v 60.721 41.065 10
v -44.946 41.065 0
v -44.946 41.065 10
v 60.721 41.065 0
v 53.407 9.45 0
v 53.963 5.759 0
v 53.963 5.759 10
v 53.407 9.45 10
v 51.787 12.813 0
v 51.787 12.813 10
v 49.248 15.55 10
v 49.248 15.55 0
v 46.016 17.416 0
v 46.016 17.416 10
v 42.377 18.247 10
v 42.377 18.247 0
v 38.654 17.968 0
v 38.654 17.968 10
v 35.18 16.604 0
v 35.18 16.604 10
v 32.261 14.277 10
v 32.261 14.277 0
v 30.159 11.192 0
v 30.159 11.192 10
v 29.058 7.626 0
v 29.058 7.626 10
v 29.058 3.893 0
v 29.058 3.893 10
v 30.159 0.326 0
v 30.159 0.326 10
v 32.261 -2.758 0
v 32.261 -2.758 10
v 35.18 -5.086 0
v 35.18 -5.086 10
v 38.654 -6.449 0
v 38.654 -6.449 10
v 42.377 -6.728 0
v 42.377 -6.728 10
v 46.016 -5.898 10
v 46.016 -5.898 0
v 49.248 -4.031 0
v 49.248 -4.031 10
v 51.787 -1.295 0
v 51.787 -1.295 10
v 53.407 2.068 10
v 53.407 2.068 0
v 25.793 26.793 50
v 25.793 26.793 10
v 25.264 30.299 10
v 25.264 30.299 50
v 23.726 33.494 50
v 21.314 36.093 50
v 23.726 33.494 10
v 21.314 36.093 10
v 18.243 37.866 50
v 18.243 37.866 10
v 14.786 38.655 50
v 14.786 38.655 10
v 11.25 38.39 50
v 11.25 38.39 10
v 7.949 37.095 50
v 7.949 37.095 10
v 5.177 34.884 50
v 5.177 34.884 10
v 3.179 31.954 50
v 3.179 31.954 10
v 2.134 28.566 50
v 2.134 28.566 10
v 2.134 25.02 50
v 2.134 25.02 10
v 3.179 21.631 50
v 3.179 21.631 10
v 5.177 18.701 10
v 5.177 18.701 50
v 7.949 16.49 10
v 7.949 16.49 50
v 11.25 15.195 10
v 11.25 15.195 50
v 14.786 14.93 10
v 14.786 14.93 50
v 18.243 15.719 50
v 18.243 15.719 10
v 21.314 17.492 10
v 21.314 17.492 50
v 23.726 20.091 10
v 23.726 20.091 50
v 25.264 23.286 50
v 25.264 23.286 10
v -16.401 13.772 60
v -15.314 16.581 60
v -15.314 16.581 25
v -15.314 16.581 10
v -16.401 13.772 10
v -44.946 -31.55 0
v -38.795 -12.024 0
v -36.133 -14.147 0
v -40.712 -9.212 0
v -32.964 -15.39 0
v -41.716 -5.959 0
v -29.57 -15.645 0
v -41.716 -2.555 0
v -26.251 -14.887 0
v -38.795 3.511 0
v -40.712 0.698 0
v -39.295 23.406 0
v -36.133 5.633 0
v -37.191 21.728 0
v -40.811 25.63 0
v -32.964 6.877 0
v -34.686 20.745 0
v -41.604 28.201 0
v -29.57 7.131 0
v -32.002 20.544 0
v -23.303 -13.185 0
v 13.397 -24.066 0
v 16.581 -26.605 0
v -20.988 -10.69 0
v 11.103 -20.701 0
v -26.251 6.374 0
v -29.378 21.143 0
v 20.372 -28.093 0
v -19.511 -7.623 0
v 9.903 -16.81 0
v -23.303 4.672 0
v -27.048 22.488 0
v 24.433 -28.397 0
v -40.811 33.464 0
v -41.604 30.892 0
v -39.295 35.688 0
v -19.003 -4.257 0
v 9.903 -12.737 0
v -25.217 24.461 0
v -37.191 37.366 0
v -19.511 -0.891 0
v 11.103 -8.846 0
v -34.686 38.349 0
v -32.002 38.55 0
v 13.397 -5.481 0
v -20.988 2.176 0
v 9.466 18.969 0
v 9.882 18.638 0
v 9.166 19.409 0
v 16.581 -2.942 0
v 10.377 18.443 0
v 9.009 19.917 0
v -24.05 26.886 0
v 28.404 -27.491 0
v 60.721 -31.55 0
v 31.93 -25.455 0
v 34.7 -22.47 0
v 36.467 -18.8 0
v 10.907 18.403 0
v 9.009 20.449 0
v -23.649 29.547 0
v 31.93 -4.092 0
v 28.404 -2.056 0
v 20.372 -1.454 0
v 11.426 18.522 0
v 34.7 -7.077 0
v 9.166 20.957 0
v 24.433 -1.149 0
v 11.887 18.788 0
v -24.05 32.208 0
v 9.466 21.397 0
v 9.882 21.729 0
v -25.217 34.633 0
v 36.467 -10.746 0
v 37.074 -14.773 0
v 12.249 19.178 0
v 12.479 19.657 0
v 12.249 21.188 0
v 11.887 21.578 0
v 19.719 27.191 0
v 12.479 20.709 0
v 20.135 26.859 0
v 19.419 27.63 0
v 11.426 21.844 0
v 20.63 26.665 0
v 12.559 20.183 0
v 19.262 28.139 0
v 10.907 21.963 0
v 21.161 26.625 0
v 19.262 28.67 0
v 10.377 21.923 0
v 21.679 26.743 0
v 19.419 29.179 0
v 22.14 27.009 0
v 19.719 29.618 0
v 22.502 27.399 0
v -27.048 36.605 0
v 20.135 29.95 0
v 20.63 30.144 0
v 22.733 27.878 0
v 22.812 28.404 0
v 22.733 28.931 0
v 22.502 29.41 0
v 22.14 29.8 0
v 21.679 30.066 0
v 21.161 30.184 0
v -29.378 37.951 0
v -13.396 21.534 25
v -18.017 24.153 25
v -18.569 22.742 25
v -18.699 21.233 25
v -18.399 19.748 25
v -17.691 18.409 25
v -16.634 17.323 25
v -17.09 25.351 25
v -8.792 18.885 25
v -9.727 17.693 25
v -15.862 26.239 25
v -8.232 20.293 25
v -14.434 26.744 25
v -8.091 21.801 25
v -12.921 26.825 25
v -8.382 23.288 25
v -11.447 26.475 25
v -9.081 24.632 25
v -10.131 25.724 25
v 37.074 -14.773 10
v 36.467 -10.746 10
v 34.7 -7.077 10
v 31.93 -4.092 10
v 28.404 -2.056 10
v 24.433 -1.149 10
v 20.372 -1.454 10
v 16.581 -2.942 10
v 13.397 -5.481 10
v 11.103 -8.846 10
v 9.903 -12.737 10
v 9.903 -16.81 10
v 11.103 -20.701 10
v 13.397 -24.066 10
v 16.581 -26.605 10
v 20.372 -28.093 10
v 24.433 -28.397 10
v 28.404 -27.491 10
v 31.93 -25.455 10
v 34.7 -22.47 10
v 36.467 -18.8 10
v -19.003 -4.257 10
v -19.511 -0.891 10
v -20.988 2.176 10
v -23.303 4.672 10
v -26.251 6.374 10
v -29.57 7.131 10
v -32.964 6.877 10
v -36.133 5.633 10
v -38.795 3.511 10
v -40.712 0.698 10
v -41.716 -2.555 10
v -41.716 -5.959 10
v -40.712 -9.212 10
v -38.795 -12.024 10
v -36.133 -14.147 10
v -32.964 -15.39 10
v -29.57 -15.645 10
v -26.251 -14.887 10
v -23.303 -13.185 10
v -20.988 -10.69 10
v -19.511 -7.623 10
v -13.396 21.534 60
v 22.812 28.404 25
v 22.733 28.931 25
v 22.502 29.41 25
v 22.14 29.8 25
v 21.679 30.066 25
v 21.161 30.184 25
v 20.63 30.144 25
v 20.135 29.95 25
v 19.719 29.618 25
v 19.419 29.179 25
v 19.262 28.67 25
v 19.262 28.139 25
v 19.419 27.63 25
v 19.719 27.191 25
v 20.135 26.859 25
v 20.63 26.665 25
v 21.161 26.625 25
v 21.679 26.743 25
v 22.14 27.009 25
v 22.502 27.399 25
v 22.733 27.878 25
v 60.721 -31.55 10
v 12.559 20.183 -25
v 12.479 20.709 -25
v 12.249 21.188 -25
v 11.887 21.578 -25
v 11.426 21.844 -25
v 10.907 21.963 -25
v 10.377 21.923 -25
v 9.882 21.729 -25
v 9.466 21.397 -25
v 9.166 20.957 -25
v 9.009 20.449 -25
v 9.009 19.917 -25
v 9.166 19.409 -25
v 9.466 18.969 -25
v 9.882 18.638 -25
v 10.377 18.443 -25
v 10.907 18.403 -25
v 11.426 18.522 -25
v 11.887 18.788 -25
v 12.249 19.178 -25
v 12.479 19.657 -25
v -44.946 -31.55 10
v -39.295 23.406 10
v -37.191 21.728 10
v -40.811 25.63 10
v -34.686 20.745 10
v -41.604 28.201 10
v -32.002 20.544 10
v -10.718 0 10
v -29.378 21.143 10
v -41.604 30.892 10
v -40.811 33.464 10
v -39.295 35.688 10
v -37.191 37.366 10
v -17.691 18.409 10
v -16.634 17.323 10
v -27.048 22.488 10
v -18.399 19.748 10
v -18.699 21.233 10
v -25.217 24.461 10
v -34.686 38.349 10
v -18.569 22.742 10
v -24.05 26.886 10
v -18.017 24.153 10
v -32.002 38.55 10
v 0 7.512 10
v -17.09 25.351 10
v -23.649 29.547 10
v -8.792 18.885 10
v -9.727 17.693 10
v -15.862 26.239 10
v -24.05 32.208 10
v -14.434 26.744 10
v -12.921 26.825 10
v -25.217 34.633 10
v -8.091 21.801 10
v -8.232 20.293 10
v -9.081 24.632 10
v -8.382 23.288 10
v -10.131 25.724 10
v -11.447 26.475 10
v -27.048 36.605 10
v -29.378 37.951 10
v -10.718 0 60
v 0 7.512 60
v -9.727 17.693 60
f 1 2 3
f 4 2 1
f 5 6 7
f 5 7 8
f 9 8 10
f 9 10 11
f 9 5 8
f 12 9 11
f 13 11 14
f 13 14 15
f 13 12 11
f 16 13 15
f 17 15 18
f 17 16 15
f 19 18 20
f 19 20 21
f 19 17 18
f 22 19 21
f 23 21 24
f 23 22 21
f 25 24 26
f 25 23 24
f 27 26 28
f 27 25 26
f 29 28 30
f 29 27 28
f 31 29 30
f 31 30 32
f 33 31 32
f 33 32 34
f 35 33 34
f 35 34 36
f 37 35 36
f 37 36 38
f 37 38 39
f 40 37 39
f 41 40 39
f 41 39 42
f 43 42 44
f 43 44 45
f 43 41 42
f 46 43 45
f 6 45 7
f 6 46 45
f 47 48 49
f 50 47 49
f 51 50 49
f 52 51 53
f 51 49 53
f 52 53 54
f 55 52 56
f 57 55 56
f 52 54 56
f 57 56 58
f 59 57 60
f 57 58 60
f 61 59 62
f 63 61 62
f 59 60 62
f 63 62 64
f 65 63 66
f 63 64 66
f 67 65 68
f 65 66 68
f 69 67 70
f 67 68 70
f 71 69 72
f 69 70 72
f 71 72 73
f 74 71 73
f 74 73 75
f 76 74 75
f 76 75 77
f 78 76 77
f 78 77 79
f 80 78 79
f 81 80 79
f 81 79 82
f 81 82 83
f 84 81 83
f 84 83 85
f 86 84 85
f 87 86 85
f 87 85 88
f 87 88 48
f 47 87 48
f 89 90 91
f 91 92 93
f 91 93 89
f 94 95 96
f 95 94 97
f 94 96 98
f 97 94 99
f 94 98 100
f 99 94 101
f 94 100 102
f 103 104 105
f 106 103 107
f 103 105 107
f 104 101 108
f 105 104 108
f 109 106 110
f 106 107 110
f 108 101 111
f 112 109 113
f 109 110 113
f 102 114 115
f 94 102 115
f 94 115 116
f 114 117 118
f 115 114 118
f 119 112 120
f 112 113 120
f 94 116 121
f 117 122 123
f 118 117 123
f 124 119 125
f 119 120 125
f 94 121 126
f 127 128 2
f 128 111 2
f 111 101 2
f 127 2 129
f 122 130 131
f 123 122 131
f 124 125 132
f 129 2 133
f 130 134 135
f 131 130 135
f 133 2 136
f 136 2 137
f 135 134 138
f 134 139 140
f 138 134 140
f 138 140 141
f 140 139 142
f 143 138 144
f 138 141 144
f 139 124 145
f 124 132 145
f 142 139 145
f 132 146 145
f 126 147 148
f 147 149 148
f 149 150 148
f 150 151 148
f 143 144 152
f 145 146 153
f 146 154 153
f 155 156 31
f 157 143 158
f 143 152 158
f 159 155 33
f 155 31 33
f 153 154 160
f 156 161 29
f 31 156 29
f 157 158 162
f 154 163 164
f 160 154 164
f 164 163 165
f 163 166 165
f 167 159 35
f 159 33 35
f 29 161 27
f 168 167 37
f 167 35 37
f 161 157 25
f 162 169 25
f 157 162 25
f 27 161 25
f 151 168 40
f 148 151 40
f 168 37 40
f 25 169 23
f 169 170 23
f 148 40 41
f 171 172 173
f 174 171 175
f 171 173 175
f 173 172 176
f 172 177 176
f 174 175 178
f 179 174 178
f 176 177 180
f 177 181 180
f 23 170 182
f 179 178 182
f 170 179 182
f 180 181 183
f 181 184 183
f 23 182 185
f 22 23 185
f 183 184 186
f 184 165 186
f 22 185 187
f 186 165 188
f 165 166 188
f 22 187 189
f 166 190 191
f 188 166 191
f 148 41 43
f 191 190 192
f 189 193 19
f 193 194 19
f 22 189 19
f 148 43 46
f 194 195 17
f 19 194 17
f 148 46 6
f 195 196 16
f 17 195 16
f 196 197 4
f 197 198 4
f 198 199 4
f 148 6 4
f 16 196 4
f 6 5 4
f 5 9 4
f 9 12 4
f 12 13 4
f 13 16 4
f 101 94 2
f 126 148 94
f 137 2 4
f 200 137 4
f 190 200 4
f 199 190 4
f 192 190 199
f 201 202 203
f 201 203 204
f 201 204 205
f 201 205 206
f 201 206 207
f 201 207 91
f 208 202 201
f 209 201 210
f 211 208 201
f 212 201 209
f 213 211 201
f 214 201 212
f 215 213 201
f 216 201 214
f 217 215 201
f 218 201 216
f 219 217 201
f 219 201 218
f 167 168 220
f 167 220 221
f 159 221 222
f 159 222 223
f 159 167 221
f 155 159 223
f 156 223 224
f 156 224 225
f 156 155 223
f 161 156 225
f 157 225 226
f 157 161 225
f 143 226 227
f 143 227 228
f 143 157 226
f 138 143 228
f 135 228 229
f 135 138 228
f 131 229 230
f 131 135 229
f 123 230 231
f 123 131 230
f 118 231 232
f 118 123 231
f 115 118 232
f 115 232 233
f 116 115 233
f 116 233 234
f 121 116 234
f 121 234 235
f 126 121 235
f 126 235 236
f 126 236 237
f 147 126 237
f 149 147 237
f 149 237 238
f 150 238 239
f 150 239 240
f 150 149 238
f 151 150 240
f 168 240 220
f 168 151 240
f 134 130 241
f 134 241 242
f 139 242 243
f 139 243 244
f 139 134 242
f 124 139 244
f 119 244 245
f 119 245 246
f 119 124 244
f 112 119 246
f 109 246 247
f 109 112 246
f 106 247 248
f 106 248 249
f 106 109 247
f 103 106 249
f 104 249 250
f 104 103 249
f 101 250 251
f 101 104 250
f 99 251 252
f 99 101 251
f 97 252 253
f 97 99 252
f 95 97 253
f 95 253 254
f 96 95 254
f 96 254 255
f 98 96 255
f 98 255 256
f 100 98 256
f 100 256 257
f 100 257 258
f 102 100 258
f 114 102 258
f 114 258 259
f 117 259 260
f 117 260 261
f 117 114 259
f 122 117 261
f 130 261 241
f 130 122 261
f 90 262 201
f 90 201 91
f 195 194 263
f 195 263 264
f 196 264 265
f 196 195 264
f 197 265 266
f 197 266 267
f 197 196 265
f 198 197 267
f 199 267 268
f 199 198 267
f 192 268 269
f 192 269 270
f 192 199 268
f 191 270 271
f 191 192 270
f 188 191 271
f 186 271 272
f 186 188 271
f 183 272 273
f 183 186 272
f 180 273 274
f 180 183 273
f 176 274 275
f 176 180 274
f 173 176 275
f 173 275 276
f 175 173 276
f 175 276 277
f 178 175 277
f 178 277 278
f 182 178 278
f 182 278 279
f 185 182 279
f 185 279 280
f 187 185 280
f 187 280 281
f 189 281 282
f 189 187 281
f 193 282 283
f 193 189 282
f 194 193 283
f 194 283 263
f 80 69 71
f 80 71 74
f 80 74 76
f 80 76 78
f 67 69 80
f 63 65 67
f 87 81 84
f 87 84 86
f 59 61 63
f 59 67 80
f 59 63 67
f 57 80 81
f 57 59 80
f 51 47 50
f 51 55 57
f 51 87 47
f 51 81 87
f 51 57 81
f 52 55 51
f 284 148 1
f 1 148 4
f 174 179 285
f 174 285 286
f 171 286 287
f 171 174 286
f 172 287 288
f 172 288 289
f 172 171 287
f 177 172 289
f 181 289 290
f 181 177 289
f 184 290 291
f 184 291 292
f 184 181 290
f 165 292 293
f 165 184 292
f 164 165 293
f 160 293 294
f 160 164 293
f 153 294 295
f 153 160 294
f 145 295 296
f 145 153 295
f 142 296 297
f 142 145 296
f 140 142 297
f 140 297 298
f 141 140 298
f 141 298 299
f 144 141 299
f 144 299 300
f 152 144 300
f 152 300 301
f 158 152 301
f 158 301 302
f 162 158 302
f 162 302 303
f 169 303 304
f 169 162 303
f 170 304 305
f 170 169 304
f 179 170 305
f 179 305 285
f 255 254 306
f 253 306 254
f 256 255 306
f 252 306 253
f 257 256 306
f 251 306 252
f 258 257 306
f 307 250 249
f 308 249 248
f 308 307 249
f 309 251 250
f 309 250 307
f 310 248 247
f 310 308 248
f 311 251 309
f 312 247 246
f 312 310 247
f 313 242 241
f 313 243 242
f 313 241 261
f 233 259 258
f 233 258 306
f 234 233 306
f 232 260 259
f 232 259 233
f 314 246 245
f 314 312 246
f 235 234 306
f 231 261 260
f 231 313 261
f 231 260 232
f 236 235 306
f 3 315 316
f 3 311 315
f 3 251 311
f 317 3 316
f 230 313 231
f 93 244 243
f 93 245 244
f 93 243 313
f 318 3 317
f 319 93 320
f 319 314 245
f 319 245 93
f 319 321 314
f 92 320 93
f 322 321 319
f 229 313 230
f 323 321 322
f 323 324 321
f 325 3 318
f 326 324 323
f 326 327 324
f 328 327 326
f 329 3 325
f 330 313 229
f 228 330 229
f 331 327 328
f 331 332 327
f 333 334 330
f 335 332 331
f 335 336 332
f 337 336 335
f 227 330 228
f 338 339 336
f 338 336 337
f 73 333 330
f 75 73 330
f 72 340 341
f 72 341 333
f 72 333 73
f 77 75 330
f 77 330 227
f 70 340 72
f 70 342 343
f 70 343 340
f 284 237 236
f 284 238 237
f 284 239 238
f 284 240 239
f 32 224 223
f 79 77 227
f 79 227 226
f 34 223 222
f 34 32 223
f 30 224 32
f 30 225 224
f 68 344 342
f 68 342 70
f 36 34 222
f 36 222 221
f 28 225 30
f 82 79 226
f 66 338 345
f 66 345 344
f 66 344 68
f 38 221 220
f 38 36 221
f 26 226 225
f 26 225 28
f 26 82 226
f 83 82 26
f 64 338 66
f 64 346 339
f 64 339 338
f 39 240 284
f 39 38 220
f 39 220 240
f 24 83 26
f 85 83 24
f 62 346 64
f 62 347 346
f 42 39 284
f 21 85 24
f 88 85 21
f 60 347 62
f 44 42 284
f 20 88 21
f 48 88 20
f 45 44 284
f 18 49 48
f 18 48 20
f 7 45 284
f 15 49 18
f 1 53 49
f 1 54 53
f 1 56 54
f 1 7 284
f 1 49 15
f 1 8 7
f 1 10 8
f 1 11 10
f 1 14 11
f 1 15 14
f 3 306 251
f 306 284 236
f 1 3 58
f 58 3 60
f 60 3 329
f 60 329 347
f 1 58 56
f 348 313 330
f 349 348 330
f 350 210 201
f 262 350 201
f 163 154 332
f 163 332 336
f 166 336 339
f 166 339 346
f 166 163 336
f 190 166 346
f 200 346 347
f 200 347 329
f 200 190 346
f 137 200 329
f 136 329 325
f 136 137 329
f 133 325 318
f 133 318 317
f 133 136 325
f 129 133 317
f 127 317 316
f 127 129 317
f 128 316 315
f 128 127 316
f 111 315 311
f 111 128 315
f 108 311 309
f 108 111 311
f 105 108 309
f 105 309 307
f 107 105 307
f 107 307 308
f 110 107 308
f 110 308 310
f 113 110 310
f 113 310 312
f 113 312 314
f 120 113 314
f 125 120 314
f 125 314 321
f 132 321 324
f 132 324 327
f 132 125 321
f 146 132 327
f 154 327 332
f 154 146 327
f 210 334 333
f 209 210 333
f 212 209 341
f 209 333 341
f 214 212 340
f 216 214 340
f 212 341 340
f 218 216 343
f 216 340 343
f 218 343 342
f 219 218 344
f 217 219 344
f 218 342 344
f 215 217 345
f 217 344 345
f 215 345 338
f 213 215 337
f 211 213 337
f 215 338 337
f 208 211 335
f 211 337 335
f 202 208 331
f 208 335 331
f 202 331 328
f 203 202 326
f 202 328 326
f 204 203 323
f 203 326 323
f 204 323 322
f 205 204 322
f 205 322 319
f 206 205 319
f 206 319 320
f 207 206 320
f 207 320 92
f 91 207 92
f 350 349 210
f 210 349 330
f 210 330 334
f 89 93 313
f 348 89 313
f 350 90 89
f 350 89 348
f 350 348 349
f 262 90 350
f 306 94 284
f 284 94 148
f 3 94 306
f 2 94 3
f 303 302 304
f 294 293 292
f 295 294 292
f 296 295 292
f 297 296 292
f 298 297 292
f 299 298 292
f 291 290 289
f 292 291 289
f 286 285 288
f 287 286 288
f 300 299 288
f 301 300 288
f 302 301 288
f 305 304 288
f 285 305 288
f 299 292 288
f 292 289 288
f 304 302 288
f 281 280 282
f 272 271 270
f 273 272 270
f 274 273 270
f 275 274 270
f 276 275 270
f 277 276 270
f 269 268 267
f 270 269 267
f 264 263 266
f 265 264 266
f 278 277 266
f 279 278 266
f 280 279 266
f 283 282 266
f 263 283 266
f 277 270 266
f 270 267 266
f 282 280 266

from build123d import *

# Parameters (mm, degrees)
F1_DEPTH = 60
F2_DEPTH = 25
F0_W     = 105.667732
F0_H     = 72.615263
F0_R     = 11.419882
F0_R_2   = 13.662159
F0_R_3   = 9.028208
F0_R_4   = 12.522377
F0_R_5   = 11.895855
F3_DEPTH = 10
F0_R_6   = 1.784712
F4_DEPTH = 50
F5_DEPTH = 25
F6_DEPTH = 25


with BuildPart() as f1:
    # F0 (on Top) → F1 (new body)
    with BuildSketch(Plane.XY):
        Polygon((-9.727011, 17.693468), (-13.396265, 21.534182), (-15.313769, 16.580629), (-16.401034, 13.77186), (-10.718366, 0), (0, 7.511924), align=None)
    extrude(amount=F1_DEPTH)

    # F0 (on Top) → F2 (join)
    with BuildSketch(Plane.XY):
        with BuildLine():
            Line((-15.313769, 16.580629), (-13.396265, 21.534182))
            Line((-13.396265, 21.534182), (-9.727011, 17.693468))
            ThreePointArc((-9.727011, 17.693468), (-14.433935, 26.743573), (-15.313769, 16.580629))
        make_face()
    extrude(amount=F2_DEPTH)

    # F0 (on Top) → F3 (join)
    with BuildSketch(Plane.XY):
        with Locations((7.88752, 4.757551)):
            Rectangle(F0_W, F0_H)
        with Locations((-30.423293, -4.256757)):
            Circle(F0_R, mode=Mode.SUBTRACT)
        with Locations((23.412162, -14.77345)):
            Circle(F0_R_2, mode=Mode.SUBTRACT)
        with BuildLine():
            Line((-16.401034, 13.77186), (-15.313769, 16.580629))
            ThreePointArc((-15.313769, 16.580629), (-14.433935, 26.743573), (-9.727011, 17.693468))
            Line((-9.727011, 17.693468), (0, 7.511924))
            Line((0, 7.511924), (-10.718366, 0))
            Line((-10.718366, 0), (-16.401034, 13.77186))
        make_face(mode=Mode.SUBTRACT)
        with Locations((-32.676868, 29.5469)):
            Circle(F0_R_3, mode=Mode.SUBTRACT)
        with Locations((41.440781, 5.759142)):
            Circle(F0_R_4, mode=Mode.SUBTRACT)
        with Locations((13.89706, 26.792528)):
            Circle(F0_R_5, mode=Mode.SUBTRACT)
    extrude(amount=F3_DEPTH)

    # F0 (on Top) → F4 (join)
    with BuildSketch(Plane.XY):
        with Locations((13.89706, 26.792528)):
            Circle(F0_R_5)
        with Locations((6.595331, 27.143202)):
            Circle(F0_R_6, mode=Mode.SUBTRACT)
        with Locations((10.773938, 20.183116)):
            Circle(F0_R_6, mode=Mode.SUBTRACT)
        with Locations((18.716843, 21.296355)):
            Circle(F0_R_6, mode=Mode.SUBTRACT)
        with Locations((21.027262, 28.404499)):
            Circle(F0_R_6, mode=Mode.SUBTRACT)
        with Locations((13.482664, 34.090918)):
            Circle(F0_R_6, mode=Mode.SUBTRACT)
        with Locations((13.482664, 34.090918)):
            Circle(F0_R_6)
        with Locations((6.595331, 27.143202)):
            Circle(F0_R_6)
        with Locations((10.773938, 20.183116)):
            Circle(F0_R_6)
        with Locations((18.716843, 21.296355)):
            Circle(F0_R_6)
        with Locations((21.027262, 28.404499)):
            Circle(F0_R_6)
    extrude(amount=F4_DEPTH)

    # F0 (on Top) → F5 (join)
    with BuildSketch(Plane.XY):
        with Locations((10.773938, 20.183116)):
            Circle(F0_R_6)
    extrude(amount=-F5_DEPTH)

    # F0 (on Top) → F6 (cut)
    with BuildSketch(Plane.XY):
        with Locations((21.027262, 28.404499)):
            Circle(F0_R_6)
    extrude(amount=F6_DEPTH, mode=Mode.SUBTRACT)


solid = f1.part
